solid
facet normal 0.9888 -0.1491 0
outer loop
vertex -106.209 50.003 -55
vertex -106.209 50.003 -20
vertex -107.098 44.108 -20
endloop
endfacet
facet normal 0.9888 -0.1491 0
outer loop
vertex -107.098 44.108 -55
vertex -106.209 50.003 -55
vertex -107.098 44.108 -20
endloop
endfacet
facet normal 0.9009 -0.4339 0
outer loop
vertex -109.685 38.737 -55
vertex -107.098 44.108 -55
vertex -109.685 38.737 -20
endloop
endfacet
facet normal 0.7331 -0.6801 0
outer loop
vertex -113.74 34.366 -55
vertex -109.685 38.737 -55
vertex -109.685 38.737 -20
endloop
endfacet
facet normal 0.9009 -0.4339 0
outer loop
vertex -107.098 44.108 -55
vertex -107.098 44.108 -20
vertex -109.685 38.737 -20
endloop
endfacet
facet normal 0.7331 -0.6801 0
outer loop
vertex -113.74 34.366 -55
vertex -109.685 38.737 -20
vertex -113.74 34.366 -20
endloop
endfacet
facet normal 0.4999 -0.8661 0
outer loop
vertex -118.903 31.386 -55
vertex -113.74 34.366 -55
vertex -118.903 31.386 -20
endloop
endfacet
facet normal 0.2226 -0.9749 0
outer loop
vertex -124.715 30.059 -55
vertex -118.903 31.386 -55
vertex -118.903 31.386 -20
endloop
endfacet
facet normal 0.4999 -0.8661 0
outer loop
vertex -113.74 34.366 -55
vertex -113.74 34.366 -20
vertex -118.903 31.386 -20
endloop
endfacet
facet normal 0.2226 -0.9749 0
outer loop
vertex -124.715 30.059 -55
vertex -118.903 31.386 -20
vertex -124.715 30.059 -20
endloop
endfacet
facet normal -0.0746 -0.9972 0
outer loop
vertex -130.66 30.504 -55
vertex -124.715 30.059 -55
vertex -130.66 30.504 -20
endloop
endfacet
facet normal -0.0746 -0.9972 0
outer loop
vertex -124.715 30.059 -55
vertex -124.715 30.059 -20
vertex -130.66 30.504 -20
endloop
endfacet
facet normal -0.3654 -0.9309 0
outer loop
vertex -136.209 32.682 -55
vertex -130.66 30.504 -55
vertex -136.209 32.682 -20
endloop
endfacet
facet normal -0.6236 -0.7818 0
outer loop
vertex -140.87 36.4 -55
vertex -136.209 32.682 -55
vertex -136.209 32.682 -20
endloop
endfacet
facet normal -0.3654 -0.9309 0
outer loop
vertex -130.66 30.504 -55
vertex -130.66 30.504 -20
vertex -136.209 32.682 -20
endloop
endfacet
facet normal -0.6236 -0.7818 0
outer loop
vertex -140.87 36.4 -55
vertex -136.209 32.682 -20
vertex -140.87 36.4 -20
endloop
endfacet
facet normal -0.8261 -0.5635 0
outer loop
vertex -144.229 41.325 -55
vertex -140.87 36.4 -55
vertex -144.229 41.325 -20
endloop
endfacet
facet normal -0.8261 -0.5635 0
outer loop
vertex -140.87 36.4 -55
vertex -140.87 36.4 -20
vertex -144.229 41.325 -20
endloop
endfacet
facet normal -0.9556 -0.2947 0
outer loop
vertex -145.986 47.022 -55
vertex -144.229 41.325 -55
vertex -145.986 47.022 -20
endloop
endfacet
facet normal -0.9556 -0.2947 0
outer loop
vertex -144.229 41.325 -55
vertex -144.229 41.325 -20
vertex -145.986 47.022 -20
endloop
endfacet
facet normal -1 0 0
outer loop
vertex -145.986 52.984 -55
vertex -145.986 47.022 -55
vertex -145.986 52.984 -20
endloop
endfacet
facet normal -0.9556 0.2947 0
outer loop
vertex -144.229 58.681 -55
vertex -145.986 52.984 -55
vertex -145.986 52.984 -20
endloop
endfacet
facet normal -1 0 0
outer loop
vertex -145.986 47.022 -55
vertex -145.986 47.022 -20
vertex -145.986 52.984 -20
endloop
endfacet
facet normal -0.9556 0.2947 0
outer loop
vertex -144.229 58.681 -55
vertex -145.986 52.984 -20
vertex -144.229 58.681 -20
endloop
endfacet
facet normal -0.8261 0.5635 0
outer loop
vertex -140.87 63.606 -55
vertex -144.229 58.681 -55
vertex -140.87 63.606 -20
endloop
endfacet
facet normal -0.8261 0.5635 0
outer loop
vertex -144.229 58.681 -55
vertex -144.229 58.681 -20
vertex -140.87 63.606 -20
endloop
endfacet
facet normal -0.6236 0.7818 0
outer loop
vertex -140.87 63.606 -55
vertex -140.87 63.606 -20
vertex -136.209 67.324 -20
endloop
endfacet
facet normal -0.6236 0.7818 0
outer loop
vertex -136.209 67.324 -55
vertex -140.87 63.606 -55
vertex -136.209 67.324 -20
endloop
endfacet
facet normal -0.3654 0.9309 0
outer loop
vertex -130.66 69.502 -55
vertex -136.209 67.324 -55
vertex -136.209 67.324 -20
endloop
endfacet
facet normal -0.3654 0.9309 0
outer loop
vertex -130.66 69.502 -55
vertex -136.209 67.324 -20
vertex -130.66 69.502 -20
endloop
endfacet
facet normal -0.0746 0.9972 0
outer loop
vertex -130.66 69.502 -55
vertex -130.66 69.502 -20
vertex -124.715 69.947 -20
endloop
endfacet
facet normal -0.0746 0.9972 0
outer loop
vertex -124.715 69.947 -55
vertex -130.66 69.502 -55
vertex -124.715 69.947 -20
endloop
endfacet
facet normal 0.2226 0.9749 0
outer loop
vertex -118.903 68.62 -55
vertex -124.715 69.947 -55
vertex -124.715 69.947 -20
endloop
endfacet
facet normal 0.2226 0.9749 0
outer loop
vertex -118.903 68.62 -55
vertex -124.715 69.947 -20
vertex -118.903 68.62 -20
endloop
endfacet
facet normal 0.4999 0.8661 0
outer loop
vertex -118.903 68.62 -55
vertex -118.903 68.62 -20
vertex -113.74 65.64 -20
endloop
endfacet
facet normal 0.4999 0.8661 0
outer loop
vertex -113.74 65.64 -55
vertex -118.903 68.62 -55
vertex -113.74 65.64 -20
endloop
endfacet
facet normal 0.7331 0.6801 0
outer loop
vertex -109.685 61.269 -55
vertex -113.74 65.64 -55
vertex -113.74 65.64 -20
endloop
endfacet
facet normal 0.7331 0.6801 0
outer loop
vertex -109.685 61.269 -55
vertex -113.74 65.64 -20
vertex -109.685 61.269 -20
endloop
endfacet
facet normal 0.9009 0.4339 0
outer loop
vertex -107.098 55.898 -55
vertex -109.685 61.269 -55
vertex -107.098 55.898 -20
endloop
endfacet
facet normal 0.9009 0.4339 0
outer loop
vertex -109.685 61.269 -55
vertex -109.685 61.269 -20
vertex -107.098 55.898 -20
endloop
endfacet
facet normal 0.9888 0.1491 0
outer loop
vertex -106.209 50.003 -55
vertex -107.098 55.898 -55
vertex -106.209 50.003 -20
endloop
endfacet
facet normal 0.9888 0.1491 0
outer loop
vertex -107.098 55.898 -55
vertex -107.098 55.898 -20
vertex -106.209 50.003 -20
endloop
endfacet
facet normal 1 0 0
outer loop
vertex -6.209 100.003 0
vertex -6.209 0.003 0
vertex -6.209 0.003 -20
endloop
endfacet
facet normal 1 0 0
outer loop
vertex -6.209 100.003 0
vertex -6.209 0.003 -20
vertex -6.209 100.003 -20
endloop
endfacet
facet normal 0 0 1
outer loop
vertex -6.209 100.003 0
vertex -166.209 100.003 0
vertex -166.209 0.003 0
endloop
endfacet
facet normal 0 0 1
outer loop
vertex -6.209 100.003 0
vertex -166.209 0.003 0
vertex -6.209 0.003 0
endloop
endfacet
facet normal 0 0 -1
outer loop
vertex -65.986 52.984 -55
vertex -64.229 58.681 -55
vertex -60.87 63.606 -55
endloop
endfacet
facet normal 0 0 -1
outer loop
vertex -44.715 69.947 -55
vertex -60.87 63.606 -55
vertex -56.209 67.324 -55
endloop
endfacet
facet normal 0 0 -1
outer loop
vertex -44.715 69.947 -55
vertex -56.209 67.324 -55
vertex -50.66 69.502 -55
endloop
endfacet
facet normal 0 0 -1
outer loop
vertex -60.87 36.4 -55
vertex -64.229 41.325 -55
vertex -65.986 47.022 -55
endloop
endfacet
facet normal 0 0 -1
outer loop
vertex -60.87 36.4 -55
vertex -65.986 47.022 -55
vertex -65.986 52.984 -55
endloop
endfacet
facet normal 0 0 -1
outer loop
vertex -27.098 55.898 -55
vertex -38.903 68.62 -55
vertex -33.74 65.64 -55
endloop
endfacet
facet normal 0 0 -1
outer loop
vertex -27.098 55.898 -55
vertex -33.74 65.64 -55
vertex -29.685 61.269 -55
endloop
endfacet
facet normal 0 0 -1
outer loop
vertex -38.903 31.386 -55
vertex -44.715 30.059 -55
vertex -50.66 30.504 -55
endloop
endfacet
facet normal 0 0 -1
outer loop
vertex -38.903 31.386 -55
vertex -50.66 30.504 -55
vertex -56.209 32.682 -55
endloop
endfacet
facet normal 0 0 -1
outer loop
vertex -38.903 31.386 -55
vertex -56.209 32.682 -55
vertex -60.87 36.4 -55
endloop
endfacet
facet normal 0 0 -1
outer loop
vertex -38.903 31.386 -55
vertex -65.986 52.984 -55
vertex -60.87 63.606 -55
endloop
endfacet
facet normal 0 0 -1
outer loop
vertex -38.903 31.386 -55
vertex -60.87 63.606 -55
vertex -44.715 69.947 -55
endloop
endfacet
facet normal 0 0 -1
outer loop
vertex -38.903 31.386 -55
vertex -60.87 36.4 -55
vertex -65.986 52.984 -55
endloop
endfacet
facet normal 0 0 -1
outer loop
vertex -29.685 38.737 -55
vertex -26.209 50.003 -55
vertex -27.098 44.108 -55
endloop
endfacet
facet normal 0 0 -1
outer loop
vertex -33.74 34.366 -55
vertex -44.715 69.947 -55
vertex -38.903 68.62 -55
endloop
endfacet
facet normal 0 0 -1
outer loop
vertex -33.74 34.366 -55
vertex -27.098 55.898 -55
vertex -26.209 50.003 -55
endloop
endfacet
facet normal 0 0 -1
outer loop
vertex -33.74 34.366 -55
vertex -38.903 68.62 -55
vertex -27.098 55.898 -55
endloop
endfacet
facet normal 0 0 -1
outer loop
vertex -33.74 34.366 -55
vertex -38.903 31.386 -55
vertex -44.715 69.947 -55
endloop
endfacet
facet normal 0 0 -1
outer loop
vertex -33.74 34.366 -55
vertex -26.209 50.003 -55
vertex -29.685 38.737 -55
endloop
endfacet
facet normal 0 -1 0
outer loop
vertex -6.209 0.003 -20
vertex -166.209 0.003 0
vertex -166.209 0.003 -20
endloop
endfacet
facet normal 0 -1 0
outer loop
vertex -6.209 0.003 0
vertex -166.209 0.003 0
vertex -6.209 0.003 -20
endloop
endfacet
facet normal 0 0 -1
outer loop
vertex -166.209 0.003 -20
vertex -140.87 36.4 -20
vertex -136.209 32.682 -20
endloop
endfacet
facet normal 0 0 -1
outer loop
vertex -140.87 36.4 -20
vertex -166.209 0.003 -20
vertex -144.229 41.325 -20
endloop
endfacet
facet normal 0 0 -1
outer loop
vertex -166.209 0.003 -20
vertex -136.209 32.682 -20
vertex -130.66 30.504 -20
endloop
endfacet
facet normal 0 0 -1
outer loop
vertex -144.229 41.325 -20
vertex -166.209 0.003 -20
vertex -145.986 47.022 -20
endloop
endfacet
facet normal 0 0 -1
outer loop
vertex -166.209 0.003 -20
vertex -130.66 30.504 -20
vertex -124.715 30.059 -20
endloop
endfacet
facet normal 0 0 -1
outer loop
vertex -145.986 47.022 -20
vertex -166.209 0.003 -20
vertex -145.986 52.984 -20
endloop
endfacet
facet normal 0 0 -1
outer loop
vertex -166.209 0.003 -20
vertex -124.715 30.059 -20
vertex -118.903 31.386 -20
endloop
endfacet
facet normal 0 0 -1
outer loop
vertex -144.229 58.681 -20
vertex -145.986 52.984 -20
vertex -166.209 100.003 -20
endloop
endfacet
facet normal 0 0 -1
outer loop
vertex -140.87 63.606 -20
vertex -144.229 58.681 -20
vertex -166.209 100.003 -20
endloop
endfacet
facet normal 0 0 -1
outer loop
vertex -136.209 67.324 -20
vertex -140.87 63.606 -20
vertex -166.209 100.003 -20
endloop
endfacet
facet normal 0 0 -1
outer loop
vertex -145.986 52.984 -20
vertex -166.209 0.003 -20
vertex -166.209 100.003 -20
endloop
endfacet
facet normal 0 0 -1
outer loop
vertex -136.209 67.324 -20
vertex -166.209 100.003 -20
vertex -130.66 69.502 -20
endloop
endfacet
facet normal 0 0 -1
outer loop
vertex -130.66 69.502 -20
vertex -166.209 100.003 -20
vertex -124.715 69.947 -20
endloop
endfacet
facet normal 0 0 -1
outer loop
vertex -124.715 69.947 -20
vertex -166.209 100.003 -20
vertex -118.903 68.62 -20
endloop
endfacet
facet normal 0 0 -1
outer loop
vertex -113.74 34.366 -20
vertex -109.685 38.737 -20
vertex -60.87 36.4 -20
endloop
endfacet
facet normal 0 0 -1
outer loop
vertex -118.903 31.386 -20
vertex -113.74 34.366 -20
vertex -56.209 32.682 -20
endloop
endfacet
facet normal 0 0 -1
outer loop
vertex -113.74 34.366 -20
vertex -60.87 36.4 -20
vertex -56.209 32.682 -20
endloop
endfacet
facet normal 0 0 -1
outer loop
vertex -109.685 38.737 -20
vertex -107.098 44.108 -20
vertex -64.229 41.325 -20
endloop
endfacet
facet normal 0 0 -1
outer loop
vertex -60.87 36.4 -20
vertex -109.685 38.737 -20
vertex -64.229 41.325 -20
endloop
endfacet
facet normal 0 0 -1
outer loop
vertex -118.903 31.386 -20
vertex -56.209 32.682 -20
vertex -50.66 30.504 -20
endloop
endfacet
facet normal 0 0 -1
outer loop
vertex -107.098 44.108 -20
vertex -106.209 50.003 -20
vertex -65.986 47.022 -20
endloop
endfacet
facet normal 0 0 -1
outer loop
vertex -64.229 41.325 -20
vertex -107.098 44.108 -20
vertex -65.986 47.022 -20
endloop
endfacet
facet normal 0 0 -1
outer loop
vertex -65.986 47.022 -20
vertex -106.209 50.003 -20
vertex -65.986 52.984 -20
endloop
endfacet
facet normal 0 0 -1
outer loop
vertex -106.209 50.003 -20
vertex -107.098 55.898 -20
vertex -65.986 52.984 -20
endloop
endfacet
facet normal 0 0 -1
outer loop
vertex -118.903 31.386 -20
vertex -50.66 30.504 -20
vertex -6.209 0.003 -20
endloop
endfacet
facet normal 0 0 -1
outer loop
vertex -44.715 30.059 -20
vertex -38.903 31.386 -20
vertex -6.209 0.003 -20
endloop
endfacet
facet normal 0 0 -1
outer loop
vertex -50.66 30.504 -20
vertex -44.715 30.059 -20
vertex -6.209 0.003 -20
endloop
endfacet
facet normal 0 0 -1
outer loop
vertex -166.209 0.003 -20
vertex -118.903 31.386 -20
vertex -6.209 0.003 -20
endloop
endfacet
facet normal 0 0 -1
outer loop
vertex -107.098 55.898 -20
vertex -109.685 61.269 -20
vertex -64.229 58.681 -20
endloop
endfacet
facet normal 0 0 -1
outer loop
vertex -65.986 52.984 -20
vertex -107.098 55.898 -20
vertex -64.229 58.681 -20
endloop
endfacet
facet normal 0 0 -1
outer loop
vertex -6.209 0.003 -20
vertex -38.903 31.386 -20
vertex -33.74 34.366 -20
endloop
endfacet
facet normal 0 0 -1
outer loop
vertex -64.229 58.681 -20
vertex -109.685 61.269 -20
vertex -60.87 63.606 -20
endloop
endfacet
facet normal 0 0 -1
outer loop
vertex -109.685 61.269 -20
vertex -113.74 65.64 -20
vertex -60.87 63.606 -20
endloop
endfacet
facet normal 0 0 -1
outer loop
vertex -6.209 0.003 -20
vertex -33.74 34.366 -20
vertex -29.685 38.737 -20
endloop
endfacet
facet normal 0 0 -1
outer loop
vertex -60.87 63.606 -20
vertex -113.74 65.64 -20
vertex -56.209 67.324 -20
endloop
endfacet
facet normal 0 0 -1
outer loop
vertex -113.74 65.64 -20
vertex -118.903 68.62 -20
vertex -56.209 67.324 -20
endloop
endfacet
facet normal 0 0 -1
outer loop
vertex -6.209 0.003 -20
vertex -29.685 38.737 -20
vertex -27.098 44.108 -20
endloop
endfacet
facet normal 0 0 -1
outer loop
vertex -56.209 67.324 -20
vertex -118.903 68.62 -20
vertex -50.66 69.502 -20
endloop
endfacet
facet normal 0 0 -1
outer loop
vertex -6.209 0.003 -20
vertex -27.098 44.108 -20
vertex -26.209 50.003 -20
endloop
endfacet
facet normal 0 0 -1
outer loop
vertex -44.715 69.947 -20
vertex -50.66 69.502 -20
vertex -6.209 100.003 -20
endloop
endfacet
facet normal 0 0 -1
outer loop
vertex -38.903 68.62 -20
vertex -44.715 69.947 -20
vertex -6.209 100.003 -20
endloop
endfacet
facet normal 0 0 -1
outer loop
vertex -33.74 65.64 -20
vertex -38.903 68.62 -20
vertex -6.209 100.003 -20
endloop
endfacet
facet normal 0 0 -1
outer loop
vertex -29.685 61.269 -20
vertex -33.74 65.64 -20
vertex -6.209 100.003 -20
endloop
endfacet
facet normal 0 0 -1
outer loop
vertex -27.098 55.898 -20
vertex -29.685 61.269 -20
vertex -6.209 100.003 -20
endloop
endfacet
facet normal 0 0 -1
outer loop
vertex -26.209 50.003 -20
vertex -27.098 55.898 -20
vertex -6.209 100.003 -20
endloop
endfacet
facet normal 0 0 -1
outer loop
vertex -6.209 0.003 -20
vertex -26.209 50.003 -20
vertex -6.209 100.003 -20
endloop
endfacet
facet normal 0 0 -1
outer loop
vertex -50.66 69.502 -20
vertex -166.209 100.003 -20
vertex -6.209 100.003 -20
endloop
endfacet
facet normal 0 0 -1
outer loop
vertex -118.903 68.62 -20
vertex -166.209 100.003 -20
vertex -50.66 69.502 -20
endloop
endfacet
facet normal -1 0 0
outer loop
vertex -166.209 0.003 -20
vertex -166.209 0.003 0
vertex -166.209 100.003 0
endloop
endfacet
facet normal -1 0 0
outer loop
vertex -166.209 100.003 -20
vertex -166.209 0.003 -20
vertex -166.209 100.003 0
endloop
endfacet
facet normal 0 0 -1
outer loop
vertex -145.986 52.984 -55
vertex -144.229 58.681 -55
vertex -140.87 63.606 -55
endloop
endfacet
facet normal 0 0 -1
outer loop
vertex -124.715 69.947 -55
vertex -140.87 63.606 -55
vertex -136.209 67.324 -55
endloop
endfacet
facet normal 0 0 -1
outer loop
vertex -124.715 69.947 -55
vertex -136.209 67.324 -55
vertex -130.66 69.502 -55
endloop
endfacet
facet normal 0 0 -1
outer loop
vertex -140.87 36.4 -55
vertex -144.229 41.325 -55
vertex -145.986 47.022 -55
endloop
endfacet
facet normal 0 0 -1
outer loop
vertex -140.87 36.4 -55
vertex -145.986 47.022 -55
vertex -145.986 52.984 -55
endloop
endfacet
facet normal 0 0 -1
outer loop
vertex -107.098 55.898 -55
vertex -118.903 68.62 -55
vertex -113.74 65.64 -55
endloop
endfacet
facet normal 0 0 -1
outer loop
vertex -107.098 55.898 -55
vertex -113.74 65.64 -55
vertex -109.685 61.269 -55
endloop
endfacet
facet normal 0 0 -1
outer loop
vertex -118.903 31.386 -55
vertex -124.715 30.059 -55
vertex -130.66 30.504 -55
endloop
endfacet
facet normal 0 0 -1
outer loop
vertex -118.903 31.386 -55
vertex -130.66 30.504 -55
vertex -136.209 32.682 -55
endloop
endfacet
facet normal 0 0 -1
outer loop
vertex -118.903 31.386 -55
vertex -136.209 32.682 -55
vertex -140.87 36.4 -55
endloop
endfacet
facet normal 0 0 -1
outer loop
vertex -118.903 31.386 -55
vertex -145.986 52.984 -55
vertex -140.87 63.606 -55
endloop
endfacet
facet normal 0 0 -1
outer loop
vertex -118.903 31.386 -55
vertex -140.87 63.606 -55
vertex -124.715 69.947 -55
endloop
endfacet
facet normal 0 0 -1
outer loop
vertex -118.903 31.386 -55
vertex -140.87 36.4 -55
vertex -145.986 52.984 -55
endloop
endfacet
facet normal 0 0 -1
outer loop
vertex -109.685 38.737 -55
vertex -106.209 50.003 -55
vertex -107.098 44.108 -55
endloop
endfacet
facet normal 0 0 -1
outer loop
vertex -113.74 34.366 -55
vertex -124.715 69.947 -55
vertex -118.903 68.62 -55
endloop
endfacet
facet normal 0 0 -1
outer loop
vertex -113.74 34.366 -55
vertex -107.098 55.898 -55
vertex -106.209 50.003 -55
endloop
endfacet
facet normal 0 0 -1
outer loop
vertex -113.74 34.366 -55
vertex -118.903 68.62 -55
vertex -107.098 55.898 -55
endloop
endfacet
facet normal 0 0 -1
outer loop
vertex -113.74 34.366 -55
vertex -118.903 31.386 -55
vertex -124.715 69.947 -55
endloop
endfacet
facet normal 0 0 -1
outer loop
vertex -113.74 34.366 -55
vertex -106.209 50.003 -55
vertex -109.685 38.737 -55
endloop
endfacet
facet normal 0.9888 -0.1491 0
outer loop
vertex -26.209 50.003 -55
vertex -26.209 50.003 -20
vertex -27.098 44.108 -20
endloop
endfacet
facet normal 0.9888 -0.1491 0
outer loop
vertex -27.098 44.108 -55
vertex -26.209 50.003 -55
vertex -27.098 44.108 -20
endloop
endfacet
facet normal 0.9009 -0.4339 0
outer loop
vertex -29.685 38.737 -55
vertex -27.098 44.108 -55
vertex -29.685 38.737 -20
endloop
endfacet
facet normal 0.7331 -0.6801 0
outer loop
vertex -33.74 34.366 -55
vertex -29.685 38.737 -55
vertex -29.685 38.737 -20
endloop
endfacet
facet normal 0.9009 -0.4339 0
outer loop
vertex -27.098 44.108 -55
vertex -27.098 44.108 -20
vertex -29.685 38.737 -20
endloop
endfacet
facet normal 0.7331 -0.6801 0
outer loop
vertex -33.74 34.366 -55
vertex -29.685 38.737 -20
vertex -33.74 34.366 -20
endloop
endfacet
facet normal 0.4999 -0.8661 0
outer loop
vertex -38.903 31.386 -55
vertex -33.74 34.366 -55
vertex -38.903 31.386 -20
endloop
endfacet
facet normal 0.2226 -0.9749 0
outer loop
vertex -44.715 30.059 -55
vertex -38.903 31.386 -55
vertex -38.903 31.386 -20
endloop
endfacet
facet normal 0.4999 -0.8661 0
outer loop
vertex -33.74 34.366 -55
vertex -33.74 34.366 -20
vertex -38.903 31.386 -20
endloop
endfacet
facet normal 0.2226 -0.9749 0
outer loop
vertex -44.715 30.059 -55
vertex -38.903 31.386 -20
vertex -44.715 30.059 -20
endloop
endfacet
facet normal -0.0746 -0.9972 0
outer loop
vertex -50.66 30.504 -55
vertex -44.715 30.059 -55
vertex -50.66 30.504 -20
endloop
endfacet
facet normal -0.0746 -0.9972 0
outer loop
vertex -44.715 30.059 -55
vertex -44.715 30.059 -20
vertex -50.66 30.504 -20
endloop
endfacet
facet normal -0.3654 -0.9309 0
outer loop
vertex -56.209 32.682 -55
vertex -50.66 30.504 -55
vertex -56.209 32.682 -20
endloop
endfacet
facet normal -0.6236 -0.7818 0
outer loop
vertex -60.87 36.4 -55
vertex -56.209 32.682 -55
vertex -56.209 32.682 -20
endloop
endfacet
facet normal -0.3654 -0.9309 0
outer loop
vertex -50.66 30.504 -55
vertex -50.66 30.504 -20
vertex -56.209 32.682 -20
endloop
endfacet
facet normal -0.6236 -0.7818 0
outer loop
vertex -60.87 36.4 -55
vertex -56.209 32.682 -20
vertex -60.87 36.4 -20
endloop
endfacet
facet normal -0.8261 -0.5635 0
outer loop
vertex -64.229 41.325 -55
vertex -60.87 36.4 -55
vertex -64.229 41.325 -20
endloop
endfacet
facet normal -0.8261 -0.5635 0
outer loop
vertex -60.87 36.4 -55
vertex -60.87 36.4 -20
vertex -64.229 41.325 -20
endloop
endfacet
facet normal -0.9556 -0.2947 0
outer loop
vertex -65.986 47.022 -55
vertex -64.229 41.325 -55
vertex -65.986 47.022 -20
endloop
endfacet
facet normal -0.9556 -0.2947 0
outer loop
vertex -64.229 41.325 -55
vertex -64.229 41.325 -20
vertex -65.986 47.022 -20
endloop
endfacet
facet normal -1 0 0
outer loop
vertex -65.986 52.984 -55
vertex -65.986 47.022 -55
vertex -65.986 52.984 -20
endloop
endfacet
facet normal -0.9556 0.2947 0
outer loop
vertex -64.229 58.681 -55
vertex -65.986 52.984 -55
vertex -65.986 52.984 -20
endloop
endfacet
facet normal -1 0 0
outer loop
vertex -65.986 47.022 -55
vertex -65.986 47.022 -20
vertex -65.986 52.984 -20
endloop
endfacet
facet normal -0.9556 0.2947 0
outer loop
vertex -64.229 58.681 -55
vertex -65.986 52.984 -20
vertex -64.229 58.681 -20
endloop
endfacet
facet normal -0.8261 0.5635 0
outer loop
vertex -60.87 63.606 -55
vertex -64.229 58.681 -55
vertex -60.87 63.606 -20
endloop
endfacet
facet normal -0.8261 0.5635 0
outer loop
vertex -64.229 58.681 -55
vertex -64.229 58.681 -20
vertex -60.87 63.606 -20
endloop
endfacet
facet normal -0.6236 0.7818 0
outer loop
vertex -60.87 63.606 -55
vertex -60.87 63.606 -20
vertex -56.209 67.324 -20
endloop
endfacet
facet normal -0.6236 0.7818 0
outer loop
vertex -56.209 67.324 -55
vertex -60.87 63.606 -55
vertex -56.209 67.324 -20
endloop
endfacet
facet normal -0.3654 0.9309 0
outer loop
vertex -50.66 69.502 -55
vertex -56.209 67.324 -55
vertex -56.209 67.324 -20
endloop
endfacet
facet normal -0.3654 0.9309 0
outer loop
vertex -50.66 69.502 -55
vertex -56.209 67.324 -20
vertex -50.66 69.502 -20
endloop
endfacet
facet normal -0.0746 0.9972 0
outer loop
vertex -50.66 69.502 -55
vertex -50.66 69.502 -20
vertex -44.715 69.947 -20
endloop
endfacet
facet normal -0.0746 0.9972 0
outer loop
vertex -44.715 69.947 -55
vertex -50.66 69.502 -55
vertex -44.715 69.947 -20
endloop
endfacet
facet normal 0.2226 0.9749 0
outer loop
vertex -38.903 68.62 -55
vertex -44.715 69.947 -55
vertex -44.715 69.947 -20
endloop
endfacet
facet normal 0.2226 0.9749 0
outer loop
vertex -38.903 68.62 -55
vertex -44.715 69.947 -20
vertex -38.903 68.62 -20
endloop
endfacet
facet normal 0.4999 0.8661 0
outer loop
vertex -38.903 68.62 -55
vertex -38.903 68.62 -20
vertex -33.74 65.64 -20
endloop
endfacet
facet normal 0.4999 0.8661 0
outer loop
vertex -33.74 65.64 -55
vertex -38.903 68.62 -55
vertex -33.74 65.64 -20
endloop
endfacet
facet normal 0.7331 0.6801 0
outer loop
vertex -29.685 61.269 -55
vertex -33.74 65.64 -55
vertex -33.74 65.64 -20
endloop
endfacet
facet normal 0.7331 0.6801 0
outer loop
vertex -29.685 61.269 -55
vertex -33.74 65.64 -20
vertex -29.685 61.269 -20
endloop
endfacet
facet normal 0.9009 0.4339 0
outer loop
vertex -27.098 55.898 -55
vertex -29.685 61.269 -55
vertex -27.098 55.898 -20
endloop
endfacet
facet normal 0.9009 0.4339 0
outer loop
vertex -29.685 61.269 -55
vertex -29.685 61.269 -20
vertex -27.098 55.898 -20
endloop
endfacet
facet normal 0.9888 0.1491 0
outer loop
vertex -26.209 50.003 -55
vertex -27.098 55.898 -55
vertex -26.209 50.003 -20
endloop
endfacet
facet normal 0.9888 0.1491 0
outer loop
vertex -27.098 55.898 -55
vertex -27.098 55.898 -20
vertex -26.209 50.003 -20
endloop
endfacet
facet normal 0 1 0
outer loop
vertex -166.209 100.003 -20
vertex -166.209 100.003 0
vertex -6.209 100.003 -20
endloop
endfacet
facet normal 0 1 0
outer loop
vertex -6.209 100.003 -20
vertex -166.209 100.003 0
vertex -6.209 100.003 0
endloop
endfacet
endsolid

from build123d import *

# Parameters (mm, degrees)
SKETCH_1_W      = 160
SKETCH_1_H      = 100
EXTRUDE_4_DEPTH = 20
SKETCH_3_R      = 20
EXTRUDE_5_DEPTH = 35


with BuildPart() as part:
    # 草图1 → 凸台-拉伸4 (new body)
    with BuildSketch(Plane.XY):
        with Locations((-86.209434593, 50.003007896)):
            Rectangle(SKETCH_1_W, SKETCH_1_H)
    extrude(amount=-EXTRUDE_4_DEPTH)

    # 草图3 → 凸台-拉伸5 (add)
    with BuildSketch(Plane(origin=(0, 0, -20), x_dir=(-1, 0, 0), z_dir=(0, 0, -1))):
        with Locations(Location((46.209434593, 50.003007896, 0), (0, 0, 180))):
            Circle(SKETCH_3_R)
        with Locations(Location((126.209434593, 50.003007896, 0), (0, 0, 180))):
            Circle(SKETCH_3_R)
    extrude(amount=EXTRUDE_5_DEPTH)


solid = part.part
